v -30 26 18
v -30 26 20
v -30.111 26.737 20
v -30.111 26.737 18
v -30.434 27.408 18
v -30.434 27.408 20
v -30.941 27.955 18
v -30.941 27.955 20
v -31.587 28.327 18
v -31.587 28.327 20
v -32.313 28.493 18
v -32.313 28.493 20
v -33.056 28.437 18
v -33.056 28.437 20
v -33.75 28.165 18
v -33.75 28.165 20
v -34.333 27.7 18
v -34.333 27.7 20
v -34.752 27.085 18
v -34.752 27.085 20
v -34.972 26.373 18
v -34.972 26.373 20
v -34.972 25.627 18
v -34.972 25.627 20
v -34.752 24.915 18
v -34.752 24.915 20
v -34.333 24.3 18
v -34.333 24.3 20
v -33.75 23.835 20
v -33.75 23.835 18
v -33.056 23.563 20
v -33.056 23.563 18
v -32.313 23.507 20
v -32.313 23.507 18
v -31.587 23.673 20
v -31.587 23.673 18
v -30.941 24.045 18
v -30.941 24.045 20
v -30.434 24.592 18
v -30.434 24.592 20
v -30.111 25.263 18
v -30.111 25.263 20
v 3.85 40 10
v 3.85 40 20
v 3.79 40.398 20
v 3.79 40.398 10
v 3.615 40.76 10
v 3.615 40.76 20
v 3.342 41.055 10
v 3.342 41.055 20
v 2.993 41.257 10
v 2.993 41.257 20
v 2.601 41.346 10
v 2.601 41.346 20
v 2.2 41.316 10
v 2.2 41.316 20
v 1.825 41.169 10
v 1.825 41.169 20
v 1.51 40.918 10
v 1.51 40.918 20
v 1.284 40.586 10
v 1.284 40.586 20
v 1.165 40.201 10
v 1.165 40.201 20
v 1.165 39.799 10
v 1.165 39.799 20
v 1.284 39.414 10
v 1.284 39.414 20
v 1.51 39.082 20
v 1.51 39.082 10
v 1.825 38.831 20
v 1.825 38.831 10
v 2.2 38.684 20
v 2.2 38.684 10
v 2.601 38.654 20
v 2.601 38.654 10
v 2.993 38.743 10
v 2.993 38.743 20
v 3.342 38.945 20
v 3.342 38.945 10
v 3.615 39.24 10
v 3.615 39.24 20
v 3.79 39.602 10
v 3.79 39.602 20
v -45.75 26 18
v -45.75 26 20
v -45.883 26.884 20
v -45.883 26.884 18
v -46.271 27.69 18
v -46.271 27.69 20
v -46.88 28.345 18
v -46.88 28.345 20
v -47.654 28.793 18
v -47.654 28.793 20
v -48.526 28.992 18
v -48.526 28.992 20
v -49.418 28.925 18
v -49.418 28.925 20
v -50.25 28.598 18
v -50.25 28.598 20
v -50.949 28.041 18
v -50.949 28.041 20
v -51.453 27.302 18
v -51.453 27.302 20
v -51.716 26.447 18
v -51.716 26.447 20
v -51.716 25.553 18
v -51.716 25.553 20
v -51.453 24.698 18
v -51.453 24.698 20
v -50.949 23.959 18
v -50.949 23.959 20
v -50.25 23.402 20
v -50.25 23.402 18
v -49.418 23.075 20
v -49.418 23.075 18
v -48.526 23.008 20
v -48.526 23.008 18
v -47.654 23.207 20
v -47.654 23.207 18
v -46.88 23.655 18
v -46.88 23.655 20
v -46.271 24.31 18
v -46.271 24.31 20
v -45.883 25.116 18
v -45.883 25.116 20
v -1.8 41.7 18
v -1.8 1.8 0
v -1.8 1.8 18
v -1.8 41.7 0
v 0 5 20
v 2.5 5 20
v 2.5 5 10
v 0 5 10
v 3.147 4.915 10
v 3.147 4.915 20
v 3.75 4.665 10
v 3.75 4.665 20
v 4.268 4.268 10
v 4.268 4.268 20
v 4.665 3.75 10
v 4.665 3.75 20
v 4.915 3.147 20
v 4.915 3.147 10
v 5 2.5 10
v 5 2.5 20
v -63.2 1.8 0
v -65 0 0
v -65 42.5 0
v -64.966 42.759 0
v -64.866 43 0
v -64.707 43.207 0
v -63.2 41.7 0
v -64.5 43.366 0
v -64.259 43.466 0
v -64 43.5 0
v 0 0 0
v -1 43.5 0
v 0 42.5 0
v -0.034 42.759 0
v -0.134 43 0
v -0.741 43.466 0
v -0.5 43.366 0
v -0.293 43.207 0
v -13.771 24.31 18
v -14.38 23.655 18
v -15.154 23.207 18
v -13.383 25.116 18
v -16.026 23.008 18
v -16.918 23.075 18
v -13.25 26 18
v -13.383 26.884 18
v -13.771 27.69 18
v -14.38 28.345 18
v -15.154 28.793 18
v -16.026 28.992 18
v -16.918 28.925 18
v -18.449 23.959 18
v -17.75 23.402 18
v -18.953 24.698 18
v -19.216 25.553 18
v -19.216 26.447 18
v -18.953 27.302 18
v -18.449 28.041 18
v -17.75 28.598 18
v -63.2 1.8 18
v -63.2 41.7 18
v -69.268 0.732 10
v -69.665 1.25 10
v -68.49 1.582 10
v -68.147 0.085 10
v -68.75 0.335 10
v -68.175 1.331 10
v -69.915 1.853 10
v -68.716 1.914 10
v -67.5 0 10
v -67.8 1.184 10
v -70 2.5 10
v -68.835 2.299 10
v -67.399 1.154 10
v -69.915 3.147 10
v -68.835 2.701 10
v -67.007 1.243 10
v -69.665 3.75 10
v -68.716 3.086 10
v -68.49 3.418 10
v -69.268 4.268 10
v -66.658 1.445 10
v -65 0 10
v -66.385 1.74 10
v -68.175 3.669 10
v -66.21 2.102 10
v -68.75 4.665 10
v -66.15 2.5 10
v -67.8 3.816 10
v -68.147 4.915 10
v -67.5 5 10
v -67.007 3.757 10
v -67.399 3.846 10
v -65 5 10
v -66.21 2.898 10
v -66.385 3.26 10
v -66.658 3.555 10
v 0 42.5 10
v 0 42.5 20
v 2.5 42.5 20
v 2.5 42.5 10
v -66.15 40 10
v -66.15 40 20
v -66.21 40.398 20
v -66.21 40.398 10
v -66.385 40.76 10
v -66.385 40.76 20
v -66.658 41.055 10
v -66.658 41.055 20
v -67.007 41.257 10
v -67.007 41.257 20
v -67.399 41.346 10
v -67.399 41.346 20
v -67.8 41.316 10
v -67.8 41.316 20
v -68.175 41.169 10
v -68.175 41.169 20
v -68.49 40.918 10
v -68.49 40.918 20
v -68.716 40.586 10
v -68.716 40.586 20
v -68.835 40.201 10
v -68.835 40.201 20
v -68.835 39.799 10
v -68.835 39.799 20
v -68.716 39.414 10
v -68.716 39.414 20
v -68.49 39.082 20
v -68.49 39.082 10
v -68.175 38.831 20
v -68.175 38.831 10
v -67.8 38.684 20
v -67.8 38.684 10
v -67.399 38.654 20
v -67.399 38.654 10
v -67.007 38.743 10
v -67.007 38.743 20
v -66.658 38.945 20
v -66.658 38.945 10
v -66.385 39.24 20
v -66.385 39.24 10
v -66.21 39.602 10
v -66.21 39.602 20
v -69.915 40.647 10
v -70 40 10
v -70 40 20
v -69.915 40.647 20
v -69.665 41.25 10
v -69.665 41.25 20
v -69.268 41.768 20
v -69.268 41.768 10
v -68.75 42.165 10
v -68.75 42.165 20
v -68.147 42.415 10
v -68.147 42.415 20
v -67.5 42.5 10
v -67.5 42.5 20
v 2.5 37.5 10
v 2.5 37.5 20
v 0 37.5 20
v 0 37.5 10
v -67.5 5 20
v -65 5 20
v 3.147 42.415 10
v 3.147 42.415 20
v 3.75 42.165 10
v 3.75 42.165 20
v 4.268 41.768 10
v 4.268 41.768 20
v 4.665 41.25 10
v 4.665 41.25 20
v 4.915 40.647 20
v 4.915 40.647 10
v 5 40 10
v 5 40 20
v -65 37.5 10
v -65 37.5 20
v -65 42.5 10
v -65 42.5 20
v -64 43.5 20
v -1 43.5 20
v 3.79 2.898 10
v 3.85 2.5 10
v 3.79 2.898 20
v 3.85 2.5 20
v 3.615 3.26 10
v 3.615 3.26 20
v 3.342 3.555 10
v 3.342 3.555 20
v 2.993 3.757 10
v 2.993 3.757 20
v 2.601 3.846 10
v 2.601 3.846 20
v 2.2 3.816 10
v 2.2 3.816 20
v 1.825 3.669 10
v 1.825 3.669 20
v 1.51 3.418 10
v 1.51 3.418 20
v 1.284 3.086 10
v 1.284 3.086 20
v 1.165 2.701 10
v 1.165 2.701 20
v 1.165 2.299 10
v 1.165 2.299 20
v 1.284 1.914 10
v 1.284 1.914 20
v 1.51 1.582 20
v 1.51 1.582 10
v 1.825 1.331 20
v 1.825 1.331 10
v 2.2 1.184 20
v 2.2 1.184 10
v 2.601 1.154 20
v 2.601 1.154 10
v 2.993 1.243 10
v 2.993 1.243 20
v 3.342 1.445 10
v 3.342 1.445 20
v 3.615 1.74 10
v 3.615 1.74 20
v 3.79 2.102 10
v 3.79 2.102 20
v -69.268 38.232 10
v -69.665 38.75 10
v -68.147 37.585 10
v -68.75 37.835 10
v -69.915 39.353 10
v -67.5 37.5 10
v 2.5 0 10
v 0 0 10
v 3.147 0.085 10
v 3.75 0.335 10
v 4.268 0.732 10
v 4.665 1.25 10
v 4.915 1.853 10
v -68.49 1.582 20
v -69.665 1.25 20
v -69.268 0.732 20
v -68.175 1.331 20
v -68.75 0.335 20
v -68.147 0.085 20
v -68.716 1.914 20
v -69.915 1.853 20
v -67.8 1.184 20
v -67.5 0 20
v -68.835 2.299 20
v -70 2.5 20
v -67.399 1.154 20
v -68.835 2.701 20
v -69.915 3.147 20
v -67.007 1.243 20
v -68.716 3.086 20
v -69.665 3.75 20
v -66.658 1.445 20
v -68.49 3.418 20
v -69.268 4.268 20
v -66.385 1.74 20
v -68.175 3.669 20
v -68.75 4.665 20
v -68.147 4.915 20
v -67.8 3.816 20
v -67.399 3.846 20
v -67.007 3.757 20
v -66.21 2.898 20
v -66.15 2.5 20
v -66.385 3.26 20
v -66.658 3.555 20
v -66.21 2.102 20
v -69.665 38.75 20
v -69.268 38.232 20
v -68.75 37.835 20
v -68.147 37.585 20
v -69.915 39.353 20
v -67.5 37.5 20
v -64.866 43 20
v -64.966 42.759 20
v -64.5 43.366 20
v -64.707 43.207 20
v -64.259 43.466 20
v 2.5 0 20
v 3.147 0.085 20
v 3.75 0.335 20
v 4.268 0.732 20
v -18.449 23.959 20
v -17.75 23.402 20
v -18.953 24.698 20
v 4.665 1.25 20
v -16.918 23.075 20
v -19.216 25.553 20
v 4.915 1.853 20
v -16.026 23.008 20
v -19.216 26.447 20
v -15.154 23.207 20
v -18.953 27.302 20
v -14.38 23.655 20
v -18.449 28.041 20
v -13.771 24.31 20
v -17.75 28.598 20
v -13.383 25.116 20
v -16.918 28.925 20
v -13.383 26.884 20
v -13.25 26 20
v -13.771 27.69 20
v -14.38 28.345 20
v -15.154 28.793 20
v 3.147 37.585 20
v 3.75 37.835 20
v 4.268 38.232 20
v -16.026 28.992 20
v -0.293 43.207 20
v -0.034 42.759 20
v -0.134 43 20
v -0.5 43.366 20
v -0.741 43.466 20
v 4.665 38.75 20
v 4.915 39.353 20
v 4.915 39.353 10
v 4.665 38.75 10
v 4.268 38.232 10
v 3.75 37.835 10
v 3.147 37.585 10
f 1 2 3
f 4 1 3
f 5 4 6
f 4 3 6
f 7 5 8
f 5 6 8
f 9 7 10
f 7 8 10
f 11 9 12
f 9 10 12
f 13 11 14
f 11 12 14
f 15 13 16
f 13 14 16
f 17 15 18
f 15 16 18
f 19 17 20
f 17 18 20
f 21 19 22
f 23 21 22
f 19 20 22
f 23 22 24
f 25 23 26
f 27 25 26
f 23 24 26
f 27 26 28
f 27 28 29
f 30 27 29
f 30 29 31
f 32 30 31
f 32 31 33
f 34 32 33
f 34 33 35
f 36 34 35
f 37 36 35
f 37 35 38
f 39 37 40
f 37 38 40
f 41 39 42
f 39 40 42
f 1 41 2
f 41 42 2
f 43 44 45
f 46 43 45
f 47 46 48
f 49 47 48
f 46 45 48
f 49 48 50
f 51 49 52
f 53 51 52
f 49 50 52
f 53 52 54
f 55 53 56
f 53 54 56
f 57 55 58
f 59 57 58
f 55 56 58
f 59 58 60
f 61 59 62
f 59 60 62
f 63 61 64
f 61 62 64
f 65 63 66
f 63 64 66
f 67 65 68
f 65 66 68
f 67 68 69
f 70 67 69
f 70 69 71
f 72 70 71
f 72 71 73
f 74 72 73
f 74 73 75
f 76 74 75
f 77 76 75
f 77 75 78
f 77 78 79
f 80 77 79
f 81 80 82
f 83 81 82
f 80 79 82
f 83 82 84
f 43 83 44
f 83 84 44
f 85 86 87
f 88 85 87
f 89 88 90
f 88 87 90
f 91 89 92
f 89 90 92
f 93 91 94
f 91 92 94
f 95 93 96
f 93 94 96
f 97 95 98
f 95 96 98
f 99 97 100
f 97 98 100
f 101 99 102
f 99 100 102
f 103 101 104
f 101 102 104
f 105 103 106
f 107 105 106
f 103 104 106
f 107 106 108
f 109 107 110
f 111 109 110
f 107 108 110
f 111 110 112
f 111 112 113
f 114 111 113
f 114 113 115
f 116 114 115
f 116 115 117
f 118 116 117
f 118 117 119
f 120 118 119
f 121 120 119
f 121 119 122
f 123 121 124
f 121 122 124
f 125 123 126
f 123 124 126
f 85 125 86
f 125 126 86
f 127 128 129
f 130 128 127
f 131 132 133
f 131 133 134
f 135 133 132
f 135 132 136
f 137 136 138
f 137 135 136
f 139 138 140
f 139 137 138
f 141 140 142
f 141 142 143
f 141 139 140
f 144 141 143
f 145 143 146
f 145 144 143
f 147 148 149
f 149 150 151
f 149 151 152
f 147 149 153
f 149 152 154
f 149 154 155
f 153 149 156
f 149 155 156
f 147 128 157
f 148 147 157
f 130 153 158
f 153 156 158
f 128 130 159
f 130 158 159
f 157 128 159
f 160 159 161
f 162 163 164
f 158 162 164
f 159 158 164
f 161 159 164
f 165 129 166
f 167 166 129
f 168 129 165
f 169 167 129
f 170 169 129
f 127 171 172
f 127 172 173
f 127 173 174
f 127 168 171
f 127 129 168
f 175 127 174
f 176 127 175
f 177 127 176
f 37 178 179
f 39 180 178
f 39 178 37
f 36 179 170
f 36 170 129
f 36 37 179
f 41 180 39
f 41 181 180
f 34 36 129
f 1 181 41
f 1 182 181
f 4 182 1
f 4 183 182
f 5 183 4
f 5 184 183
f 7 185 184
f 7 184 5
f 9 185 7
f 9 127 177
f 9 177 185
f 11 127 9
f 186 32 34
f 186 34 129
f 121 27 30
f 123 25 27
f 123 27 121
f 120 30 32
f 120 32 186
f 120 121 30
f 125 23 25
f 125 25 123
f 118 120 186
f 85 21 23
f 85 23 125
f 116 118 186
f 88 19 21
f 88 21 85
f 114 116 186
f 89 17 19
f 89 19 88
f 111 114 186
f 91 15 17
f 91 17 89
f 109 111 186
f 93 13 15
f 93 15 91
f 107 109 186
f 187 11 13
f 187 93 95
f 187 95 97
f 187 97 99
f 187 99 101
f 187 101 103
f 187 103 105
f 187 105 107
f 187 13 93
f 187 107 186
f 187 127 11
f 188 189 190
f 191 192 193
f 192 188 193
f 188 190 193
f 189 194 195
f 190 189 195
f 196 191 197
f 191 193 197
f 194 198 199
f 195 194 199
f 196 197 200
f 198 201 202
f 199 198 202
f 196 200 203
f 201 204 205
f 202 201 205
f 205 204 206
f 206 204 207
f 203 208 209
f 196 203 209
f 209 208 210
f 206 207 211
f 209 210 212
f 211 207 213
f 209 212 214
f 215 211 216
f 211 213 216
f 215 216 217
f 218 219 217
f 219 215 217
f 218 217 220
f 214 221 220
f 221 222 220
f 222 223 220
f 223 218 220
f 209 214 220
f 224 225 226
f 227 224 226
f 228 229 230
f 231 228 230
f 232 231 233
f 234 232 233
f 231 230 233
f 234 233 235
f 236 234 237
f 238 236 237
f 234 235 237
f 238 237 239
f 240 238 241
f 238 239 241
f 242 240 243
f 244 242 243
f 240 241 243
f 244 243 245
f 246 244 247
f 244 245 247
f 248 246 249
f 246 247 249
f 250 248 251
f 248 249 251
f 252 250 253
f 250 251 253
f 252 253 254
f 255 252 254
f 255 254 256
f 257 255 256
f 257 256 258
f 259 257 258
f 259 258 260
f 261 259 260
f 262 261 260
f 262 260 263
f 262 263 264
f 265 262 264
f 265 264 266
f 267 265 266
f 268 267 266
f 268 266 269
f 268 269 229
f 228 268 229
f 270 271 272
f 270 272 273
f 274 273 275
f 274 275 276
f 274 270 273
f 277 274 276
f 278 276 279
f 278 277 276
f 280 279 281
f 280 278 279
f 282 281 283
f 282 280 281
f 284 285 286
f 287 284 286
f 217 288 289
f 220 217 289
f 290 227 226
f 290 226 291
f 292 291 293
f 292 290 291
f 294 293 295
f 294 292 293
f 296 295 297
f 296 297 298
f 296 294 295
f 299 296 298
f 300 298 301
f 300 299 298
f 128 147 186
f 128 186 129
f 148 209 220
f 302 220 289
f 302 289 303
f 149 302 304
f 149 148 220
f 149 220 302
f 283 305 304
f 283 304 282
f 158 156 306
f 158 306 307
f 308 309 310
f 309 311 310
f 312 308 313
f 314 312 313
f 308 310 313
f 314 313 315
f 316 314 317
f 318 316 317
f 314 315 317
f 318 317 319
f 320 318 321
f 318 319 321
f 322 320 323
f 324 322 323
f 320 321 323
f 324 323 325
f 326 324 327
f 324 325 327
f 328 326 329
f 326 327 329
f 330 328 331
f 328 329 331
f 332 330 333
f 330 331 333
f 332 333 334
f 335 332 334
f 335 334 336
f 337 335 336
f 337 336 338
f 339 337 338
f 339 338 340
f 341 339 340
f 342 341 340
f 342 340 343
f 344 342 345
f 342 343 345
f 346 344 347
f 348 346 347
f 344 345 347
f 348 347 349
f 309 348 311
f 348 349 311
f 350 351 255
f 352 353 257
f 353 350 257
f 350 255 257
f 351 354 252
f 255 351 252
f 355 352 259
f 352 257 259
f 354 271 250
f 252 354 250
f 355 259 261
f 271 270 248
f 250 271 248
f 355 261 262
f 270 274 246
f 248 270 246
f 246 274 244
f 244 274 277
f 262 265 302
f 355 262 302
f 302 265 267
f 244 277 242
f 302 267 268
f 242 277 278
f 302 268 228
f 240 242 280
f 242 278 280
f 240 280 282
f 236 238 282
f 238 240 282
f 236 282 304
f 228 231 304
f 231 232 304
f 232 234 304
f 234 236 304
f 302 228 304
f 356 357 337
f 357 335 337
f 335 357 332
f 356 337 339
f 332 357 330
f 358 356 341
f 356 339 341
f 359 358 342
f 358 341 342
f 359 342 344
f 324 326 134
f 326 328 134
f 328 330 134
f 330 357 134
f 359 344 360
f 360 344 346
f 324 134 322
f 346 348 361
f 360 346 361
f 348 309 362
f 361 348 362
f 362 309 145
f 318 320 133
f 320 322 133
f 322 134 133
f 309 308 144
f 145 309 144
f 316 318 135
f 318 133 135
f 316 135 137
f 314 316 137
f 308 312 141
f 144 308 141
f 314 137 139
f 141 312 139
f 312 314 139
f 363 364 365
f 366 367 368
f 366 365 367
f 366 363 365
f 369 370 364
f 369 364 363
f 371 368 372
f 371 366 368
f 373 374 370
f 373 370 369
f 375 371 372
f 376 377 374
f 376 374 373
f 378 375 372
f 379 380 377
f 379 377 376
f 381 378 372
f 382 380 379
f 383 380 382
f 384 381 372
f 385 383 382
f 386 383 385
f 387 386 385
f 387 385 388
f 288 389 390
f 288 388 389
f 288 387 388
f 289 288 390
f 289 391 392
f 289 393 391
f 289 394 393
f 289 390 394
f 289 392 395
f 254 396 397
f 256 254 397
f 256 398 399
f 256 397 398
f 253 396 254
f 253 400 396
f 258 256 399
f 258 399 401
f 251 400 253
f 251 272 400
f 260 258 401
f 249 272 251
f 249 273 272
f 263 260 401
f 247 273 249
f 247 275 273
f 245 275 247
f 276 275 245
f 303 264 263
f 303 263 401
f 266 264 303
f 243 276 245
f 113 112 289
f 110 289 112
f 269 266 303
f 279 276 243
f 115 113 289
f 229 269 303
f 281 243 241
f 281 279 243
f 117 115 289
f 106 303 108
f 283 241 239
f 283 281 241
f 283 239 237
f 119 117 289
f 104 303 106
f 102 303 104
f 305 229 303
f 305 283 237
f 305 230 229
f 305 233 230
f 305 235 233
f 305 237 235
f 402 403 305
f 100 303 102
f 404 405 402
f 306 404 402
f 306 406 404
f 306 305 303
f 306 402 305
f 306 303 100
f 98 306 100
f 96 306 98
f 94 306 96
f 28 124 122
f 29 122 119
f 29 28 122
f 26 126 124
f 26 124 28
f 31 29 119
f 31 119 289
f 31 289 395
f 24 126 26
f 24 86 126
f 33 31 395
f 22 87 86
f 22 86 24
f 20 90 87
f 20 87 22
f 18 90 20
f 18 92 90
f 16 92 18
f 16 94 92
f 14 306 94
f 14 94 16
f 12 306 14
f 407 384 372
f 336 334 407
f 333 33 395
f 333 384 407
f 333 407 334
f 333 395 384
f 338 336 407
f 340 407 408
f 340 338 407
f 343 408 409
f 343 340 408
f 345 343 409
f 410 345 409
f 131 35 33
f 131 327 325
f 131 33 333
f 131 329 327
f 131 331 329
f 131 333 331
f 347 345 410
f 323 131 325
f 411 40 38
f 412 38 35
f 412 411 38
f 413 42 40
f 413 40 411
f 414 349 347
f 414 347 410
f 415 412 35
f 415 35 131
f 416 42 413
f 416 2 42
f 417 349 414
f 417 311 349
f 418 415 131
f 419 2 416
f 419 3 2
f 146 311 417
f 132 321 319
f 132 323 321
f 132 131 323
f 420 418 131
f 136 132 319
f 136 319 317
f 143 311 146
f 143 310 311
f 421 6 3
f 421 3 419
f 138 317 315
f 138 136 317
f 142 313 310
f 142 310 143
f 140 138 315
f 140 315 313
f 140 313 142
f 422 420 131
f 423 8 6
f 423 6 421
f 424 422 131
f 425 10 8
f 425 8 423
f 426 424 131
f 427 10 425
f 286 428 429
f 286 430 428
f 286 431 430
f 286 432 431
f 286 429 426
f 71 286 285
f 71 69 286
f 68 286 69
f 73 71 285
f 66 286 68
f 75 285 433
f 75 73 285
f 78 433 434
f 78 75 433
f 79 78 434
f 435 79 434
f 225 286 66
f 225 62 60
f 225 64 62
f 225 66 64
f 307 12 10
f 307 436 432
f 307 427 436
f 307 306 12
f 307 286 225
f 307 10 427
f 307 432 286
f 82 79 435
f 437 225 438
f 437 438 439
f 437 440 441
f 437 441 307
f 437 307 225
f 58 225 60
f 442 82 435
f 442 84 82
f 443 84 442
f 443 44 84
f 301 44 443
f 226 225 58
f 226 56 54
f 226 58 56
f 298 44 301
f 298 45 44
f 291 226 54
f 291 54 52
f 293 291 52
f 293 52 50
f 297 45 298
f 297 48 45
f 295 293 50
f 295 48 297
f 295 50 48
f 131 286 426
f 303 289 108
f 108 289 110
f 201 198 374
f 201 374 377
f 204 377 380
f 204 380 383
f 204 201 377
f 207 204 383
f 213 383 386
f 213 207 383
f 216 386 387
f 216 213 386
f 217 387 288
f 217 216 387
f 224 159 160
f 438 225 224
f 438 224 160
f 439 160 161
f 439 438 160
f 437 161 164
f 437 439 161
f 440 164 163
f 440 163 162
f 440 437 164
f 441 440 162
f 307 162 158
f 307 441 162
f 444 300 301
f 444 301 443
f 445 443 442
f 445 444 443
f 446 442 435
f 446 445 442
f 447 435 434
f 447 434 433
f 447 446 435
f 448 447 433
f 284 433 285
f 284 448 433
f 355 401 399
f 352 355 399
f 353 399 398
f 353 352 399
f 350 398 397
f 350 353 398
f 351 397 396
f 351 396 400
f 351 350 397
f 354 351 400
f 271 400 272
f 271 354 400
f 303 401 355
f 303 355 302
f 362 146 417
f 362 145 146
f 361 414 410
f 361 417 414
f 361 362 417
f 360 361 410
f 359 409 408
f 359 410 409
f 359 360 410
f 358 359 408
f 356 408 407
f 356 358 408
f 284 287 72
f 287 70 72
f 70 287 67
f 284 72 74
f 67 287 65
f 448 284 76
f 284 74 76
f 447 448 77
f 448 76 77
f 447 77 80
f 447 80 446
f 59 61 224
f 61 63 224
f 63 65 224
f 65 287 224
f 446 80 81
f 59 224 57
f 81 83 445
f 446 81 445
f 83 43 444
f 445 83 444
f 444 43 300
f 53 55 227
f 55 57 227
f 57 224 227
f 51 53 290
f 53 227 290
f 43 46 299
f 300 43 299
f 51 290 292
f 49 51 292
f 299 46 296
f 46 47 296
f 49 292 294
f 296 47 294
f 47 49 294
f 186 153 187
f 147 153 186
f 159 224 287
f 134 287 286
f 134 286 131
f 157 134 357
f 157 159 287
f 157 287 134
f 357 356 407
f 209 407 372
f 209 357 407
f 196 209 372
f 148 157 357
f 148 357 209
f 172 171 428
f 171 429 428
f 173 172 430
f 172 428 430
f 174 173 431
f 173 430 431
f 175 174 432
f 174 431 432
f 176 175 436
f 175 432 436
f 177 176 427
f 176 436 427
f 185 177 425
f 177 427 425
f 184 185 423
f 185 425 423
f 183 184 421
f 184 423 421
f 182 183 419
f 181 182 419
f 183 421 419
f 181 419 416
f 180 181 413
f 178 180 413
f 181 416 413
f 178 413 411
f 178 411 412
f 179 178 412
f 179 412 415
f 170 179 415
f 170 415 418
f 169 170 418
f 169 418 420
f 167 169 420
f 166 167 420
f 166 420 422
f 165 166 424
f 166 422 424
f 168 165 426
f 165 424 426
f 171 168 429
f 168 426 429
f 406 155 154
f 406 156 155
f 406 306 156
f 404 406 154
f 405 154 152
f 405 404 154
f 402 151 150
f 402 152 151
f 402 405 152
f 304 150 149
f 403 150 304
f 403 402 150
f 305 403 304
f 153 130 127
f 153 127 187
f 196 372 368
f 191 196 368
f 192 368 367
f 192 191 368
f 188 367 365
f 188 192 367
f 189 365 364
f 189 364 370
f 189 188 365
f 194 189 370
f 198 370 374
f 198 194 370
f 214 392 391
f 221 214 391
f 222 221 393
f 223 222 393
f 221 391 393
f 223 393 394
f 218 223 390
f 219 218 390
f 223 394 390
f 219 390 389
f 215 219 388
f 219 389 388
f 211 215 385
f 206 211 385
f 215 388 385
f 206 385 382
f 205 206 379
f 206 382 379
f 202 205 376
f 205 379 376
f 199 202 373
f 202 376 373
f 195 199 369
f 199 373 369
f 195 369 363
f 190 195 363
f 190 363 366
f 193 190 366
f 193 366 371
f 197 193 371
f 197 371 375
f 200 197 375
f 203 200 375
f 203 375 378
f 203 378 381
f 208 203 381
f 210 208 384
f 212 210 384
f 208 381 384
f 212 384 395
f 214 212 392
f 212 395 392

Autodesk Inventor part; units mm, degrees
ref_plane "YZ Plane" through (0, 0, 0) normal (1, 0, 0) x (0, 1, 0)
ref_plane "XZ Plane" through (0, 0, 0) normal (0, 1, 0) x (-1, 0, 0)
ref_plane "XY Plane" through (0, 0, 0) normal (0, 0, 1) x (1, 0, 0)
sketch "Sketch1" plane through (0, 0, 0) normal (0, 0, 1) x (1, 0, 0)
  line L0 (0, 0) -> (-65, 0)
  line L1 (-65, 0) -> (-65, 43.5)
  line L2 (-65, 43.5) -> (0, 43.5)
  line L3 (0, 43.5) -> (0, 0)
  dimension "d0" = 43.5
  dimension "d1" = 65
extrude "Extrusion1" add sketch "Sketch1" along normal blind 20
sketch "Sketch2" plane through (0, 0, 0) normal (0, 0, -1) x (-1, 0, 0)
  line L0 (1.8, 41.7) -> (63.2, 41.7)
  line L1 (63.2, 41.7) -> (63.2, 1.8)
  line L2 (63.2, 1.8) -> (1.8, 1.8)
  line L3 (1.8, 1.8) -> (1.8, 41.7)
  line L4 (65, 43.5) -> (65, 0) projected
  line L5 (0, 43.5) -> (65, 43.5) projected
  line L6 (0, 0) -> (0, 43.5) projected
  line L7 (65, 0) -> (0, 0) projected
  point P0 (65, 21.75)
  dimension "d4" = 1.8
  dimension "d5" = 1.8
  dimension "d6" = 1.8
  dimension "d7" = 1.8
extrude "Extrusion2" cut sketch "Sketch2" against normal blind 18 contours L0 L1 L2 L3
sketch "Sketch3" plane through (0, 0, 20) normal (0, 0, 1) x (1, 0, 0)
  circle A0 centre (-48.75, 26) radius 3
  circle A1 centre (-32.5, 26) radius 2.5
  circle A2 centre (-16.25, 26) radius 3
  line L0 (-65, 43.5) -> (-65, 0) projected
  line L1 (0, 43.5) -> (-65, 43.5) projected
  point P0 (0, 0)
  dimension "d10" = 16.25
  dimension "d11" = 16.25
  dimension "d12" = 16.25
  dimension "d13" = 6
  dimension "d14" = 17.5
  dimension "d15" = 5
extrude "Extrusion3" cut sketch "Sketch3" against normal up to surface (2 mm away)
fillet "Fillet1" radius 1 2 edges at (-65, 43.5, 10) (0, 43.5, 10)
sketch "Sketch4" plane through (0, 0, 20) normal (0, 0, 1) x (1, 0, 0)
  line L0 (0, 0) -> (0, 42.5) projected
  line L1 (0, 42.5) -> (5, 42.5)
  line L2 (5, 42.5) -> (5, 37.5)
  line L3 (5, 37.5) -> (0, 37.5)
  line L4 (0, 37.5) -> (0, 42.5)
  line L5 (-65, 42.5) -> (-65, 0) projected
  line L6 (-65, 42.5) -> (-70, 42.5)
  line L7 (-70, 42.5) -> (-70, 37.5)
  line L8 (-70, 37.5) -> (-65, 37.5)
  line L9 (-65, 37.5) -> (-65, 42.5)
  circle A0 centre (-67.5, 40) radius 1.35
  circle A1 centre (2.5, 40) radius 1.35
  line L10 (0, 0) -> (5, 0)
  line L11 (5, 0) -> (5, 5)
  line L12 (5, 5) -> (0, 5)
  line L13 (0, 5) -> (0, 0)
  line L14 (-65, 0) -> (0, 0) projected
  line L15 (-65, 0) -> (-70, 0)
  line L16 (-70, 0) -> (-70, 5)
  line L17 (-70, 5) -> (-65, 5)
  line L18 (-65, 5) -> (-65, 0)
  circle A2 centre (-67.5, 2.5) radius 1.35
  circle A3 centre (2.5, 2.5) radius 1.35
  dimension "d19" = 5
  dimension "d20" = 5
  dimension "d21" = 5
  dimension "d22" = 5
  dimension "d23" = 2.7
  dimension "d24" = 2.7
  dimension "d25" = 5
  dimension "d26" = 5
  dimension "d27" = 5
  dimension "d28" = 5
  dimension "d29" = 2.5
  dimension "d30" = 2.5
  dimension "d31" = 2.5
  dimension "d32" = 2.5
  dimension "d33" = 2.5
  dimension "d34" = 2.5
  dimension "d35" = 2.7
  dimension "d36" = 2.7
  dimension "d37" = 2.5
  dimension "d38" = 2.5
extrude "Extrusion4" add sketch "Sketch4" against normal blind 10
full round fillet "Full Round Fillet1" first side at (3.3333, 5, 16.6667) centre faces at (5, 1.6667, 16.6667) second side at (-43.3333, 0, 16.6667)
full round fillet "Full Round Fillet2" first side at (-44.1666, 0, 16.6667) centre faces at (-70, 3.3333, 16.6667) second side at (-66.6667, 5, 16.6667)
full round fillet "Full Round Fillet3" first side at (-66.6667, 42.5, 16.6667) centre faces at (-70, 40.8333, 16.6667) second side at (-68.3333, 37.5, 16.6667)
full round fillet "Full Round Fillet4" first side at (1.6667, 37.5, 16.6667) centre faces at (5, 39.1667, 16.6667) second side at (3.3333, 42.5, 16.6667)
properties part number "BUTTON COVER"
